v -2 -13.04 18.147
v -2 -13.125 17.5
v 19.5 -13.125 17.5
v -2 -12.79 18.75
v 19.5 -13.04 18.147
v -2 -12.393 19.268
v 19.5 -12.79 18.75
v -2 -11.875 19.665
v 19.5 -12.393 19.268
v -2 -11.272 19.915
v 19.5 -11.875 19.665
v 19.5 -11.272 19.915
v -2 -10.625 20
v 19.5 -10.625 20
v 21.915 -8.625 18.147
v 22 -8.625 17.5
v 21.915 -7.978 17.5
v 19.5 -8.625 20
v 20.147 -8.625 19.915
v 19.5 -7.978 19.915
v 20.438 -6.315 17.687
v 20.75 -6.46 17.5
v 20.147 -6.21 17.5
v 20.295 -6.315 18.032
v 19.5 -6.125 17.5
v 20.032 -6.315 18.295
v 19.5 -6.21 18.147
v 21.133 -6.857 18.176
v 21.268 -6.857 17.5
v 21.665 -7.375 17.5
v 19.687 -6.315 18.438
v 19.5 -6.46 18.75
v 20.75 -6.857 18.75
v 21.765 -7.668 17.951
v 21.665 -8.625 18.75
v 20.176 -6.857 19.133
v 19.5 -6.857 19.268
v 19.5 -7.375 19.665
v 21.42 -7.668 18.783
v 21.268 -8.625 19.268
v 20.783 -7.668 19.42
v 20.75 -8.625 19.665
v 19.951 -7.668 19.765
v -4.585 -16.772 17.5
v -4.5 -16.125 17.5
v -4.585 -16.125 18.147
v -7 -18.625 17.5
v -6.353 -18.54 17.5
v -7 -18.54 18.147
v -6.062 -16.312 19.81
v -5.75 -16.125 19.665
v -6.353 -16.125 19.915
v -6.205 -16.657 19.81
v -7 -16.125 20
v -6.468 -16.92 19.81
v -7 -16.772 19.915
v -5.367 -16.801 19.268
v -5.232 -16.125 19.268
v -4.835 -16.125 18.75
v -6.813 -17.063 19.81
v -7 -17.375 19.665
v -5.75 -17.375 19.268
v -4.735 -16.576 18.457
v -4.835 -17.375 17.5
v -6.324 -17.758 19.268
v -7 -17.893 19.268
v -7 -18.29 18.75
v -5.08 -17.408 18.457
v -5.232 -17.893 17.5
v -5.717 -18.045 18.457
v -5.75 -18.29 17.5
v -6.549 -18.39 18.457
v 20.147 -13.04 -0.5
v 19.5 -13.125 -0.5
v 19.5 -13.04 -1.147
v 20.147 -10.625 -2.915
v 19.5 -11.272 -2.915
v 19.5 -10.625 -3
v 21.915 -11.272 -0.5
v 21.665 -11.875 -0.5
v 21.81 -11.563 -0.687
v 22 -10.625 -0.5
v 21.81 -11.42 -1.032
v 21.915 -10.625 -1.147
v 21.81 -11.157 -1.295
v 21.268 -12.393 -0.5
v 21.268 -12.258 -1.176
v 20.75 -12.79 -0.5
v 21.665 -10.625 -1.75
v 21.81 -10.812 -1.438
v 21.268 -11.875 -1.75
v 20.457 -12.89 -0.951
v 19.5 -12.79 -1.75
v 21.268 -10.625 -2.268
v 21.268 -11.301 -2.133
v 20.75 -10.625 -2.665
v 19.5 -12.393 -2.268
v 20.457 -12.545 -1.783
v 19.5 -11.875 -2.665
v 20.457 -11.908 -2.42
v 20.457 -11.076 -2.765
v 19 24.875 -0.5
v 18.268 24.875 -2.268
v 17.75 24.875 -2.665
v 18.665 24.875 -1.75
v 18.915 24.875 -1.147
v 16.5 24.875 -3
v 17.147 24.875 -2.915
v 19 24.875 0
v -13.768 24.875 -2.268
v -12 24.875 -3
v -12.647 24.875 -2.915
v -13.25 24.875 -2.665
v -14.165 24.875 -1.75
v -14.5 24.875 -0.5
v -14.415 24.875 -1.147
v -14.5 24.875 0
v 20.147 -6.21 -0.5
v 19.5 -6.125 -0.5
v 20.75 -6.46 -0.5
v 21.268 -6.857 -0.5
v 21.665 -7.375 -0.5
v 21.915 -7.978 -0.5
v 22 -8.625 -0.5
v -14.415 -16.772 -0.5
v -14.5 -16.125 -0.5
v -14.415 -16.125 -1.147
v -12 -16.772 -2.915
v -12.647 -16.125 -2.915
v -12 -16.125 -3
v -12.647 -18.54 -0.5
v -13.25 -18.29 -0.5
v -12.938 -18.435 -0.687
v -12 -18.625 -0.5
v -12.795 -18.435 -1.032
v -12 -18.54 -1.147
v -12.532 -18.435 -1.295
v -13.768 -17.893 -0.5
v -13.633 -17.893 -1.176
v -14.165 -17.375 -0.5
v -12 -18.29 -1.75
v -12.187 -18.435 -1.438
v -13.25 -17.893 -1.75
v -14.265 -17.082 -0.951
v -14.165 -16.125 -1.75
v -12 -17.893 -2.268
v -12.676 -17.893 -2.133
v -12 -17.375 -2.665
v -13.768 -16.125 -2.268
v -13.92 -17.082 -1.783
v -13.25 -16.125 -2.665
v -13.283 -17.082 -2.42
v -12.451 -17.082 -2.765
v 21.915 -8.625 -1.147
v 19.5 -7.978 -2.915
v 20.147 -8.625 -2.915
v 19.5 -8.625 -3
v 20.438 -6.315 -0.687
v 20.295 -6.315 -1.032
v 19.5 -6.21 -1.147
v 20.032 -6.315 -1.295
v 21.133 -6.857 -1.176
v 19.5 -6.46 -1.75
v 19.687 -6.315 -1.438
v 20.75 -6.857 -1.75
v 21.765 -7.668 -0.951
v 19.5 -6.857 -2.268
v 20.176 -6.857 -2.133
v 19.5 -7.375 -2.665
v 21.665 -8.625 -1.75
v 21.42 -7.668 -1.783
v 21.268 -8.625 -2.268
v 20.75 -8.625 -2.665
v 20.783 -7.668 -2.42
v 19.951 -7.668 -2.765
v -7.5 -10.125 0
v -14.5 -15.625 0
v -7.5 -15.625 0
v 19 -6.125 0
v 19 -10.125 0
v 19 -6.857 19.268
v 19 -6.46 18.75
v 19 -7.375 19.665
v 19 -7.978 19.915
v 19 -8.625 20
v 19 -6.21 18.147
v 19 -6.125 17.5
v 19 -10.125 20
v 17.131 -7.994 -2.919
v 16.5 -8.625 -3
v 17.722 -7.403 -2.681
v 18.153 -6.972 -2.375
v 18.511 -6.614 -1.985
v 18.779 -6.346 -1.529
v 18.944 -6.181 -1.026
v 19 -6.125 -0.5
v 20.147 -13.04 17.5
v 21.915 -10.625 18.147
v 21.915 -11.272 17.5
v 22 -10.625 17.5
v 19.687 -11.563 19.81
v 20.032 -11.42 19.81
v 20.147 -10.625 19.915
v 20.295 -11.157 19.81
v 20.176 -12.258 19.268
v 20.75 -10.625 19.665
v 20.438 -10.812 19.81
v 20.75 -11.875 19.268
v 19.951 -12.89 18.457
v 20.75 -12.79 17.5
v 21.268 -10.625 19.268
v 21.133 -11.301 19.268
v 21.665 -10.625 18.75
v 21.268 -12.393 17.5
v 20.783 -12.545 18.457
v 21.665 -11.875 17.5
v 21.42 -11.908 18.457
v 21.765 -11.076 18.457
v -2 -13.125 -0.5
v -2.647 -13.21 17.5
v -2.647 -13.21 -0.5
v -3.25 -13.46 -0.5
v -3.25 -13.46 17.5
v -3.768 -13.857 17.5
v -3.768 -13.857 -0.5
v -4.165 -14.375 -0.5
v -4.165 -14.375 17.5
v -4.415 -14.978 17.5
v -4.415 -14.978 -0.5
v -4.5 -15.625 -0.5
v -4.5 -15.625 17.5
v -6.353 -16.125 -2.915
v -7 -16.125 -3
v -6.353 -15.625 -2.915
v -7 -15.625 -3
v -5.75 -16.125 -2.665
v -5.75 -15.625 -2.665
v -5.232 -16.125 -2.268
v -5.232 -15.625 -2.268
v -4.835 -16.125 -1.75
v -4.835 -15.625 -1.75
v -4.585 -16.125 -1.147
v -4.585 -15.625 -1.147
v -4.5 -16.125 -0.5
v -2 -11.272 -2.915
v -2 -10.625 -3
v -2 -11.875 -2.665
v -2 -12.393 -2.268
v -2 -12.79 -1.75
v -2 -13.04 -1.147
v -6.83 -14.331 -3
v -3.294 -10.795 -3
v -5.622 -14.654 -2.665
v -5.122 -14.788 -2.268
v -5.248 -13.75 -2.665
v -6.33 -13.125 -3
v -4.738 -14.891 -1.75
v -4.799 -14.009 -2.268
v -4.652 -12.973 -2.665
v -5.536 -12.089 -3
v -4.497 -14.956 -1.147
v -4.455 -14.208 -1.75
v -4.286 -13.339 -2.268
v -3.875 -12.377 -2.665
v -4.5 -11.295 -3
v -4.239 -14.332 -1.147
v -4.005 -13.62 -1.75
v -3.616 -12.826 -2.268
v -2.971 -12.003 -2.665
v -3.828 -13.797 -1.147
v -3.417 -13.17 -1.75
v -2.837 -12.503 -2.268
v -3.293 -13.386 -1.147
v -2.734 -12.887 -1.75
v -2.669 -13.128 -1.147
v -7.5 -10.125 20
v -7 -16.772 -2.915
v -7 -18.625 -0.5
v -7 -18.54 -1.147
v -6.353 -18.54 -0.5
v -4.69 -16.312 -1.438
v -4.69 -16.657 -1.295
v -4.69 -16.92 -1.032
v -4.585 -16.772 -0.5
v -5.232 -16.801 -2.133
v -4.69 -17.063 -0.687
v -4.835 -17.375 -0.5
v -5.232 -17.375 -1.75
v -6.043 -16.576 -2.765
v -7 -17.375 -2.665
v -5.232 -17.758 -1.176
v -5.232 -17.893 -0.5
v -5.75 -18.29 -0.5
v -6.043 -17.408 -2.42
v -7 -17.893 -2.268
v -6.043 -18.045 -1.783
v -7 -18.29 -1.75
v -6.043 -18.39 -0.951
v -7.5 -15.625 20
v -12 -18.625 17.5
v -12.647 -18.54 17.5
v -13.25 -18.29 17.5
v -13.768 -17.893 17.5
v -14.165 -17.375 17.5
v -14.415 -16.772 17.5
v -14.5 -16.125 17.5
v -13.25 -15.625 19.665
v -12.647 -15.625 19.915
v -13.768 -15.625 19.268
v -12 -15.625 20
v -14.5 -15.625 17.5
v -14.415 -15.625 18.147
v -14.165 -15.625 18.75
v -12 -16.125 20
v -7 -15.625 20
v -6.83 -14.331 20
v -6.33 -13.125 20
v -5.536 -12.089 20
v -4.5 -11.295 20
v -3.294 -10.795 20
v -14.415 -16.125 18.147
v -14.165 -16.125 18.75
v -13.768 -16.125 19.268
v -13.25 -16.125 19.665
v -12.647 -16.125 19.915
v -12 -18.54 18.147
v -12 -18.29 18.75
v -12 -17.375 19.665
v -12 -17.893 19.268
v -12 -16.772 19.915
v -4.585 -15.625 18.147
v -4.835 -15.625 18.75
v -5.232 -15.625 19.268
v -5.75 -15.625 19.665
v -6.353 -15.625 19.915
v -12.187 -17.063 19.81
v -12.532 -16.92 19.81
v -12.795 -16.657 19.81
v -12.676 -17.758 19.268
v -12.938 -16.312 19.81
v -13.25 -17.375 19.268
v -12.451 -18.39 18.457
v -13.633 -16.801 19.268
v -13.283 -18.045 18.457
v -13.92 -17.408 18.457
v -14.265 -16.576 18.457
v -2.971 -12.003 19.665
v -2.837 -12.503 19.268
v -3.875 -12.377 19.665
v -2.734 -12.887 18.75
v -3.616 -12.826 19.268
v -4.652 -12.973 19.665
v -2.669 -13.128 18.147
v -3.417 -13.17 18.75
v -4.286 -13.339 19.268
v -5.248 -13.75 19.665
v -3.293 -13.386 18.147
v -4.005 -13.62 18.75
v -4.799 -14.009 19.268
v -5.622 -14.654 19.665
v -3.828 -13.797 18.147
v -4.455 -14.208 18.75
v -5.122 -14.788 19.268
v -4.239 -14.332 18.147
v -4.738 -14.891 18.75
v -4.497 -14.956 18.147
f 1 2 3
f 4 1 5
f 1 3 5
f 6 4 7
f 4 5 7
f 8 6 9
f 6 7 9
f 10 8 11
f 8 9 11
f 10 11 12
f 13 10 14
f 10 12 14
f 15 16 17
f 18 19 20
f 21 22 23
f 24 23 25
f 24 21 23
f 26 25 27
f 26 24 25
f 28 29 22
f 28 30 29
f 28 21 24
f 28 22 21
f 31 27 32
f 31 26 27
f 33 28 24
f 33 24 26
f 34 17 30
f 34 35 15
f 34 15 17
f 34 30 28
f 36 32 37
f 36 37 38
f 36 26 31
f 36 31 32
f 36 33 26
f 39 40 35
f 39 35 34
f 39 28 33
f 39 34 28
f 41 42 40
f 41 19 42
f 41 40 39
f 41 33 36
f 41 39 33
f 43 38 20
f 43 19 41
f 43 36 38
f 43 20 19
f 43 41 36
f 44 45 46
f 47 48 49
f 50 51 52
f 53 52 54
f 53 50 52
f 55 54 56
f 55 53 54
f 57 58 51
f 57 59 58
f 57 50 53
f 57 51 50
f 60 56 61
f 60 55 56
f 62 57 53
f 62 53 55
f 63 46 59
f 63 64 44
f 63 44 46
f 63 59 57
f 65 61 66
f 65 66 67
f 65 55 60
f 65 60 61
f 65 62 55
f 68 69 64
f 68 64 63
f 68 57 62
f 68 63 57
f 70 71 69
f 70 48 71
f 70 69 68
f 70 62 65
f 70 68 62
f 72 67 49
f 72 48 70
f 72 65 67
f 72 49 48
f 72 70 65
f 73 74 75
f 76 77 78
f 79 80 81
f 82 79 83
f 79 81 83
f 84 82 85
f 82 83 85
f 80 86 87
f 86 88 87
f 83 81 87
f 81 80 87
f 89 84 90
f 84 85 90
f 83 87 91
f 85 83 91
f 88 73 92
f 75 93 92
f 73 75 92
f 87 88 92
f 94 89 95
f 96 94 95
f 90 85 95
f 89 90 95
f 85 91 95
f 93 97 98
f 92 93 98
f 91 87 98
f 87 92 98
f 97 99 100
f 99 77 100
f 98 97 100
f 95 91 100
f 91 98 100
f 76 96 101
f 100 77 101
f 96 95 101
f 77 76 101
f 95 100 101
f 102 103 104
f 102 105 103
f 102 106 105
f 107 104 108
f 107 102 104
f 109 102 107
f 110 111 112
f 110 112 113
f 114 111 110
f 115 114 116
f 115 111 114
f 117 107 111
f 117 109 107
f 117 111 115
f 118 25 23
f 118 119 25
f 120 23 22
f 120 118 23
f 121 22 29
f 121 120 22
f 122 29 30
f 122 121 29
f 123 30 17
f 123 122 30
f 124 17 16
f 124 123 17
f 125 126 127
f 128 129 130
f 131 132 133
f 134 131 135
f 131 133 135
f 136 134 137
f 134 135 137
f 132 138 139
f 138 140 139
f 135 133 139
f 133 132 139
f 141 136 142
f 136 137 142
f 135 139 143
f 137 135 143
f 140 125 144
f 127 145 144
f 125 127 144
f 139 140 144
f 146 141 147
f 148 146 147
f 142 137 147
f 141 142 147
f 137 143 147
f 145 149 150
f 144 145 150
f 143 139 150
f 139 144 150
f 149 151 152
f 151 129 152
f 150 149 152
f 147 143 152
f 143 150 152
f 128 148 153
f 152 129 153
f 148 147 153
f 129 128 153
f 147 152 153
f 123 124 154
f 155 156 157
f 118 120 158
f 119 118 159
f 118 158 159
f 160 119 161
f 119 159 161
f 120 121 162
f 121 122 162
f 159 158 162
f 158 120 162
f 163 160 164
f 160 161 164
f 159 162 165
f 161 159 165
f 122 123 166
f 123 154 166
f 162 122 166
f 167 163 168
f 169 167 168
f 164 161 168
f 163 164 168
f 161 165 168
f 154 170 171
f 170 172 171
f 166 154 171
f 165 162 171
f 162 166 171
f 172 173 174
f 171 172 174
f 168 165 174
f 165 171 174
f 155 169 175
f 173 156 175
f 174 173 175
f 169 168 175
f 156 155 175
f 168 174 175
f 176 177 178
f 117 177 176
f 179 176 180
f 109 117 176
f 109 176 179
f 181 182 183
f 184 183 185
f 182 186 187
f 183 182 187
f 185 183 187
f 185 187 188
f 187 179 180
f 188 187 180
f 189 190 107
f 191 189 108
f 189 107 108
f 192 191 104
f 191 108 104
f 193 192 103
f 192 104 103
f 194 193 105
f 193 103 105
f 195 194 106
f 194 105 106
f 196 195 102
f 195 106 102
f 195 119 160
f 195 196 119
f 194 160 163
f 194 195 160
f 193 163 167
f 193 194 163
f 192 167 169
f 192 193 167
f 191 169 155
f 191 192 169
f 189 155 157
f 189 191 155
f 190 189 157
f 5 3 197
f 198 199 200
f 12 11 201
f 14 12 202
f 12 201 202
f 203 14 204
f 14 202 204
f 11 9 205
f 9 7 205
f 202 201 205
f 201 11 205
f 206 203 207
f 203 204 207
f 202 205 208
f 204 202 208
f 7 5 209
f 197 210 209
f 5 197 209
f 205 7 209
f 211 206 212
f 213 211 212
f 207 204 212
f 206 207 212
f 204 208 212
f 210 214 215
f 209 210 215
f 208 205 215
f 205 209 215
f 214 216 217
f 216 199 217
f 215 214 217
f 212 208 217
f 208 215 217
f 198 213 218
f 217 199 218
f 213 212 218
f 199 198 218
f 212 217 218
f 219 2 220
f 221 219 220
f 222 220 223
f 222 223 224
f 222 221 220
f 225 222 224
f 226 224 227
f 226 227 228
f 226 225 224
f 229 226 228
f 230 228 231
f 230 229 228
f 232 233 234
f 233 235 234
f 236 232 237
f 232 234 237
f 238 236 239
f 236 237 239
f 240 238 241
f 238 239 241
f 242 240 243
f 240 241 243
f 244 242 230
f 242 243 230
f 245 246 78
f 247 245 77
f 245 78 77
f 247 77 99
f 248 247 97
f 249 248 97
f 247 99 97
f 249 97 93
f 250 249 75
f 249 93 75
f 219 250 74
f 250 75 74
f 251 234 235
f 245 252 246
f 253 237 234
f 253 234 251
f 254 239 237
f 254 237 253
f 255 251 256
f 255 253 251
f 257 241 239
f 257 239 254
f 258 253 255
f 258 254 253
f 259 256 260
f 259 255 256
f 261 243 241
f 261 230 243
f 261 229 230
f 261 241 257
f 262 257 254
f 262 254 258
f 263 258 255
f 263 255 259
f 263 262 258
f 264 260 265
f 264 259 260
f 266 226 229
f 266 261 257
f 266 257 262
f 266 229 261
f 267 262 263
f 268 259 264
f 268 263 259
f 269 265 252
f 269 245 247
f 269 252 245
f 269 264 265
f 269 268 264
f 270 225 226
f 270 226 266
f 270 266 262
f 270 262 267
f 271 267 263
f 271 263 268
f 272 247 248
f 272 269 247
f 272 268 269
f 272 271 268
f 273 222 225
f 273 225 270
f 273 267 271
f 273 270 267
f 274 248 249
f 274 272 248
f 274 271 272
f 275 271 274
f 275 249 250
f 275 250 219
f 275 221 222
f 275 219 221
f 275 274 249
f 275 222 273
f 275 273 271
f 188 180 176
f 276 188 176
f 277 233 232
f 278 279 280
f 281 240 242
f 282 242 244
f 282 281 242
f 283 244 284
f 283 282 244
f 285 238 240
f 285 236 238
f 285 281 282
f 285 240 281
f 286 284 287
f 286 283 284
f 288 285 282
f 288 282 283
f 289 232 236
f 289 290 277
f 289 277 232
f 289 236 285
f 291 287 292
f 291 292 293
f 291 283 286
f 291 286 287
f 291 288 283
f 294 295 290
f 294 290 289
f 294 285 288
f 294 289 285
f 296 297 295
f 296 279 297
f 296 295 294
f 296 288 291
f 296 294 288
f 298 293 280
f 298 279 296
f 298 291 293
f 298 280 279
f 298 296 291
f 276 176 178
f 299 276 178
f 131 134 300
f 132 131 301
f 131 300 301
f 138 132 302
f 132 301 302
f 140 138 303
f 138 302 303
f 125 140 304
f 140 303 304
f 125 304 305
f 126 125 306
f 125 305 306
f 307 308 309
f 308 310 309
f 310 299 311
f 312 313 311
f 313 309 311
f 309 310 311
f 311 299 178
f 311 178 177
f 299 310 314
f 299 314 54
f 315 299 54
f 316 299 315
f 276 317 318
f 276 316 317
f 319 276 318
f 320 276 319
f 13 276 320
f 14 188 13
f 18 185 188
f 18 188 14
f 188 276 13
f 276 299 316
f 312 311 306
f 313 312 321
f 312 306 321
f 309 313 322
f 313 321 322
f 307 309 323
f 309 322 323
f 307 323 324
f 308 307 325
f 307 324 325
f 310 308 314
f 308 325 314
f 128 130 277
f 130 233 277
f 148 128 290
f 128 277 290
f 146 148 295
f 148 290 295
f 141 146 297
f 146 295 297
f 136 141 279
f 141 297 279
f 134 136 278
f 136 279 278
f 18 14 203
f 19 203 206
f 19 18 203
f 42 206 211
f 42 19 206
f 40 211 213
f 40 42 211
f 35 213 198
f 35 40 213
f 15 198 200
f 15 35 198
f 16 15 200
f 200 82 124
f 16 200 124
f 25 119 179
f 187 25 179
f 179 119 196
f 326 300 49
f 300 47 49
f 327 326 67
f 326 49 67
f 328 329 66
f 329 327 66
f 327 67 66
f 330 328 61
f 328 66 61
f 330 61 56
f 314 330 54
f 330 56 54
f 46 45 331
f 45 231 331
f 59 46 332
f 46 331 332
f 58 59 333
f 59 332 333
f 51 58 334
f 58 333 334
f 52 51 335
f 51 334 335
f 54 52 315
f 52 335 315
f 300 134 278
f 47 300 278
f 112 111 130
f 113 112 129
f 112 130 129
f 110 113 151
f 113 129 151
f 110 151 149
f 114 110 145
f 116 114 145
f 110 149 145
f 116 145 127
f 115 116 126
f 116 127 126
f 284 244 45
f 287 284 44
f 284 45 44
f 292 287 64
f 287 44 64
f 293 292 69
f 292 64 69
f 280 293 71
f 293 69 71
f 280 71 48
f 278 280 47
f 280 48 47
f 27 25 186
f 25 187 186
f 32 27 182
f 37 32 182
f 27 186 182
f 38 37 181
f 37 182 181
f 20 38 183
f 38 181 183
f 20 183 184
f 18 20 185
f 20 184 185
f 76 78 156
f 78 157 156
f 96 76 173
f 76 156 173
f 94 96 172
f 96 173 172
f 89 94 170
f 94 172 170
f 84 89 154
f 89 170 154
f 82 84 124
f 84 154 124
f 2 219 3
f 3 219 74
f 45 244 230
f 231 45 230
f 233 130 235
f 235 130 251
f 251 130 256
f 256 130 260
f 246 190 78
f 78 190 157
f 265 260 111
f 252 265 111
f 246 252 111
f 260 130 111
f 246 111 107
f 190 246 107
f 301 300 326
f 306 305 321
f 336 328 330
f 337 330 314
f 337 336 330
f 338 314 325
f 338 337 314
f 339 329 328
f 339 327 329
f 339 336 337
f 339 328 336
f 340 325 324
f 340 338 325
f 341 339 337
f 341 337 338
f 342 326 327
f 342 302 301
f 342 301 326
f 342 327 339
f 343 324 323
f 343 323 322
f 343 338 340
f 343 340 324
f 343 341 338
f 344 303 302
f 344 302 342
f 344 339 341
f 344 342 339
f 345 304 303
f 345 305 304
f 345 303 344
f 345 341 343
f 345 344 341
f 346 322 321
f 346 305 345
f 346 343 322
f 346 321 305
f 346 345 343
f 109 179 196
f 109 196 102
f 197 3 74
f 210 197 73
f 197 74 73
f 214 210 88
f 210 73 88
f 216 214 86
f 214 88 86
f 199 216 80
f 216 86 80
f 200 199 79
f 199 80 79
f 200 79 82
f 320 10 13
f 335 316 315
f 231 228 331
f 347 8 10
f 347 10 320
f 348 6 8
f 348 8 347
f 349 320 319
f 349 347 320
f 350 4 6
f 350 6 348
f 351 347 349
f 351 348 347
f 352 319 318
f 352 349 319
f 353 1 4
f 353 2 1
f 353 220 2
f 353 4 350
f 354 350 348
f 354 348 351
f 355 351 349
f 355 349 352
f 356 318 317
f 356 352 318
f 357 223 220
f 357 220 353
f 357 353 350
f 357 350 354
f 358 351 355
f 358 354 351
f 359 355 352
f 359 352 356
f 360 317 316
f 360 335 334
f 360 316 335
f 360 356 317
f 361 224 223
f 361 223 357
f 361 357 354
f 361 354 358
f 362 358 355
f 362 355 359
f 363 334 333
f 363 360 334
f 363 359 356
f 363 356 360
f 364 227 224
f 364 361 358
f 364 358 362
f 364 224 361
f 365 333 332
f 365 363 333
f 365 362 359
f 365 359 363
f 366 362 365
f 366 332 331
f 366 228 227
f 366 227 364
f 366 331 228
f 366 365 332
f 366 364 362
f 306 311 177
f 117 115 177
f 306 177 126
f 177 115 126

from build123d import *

# Parameters (mm, degrees)
F0_W     = 23.5
F0_H     = 3
F1_DEPTH = 3
F2_DEPTH = 20
F3_R     = 2.5


with BuildPart() as f1:
    # F0 (on Top) → F1 (new body)
    with BuildSketch(Plane.XY):
        Polygon((-14.5, 24.875), (-14.5, -15.625), (-7.5, -15.625), (-7.5, -10.125), (-4.5, -10.125), (19, -10.125), (19, -6.125), (19, 24.875), align=None)
        Polygon((-7.5, -15.625), (-14.5, -15.625), (-14.5, -18.625), (-7.5, -18.625), (-4.5, -18.625), (-4.5, -13.125), (-4.5, -10.125), (-7.5, -10.125), align=None)
        with Locations((7.25, -11.625)):
            Rectangle(F0_W, F0_H)
        Polygon((22, -6.125), (19, -6.125), (19, -10.125), (19, -13.125), (22, -13.125), (22, -10.125), align=None)
    extrude(amount=-F1_DEPTH)

    # F0 (on Top) → F2 (join)
    with BuildSketch(Plane.XY):
        Polygon((22, -6.125), (19, -6.125), (19, -10.125), (19, -13.125), (22, -13.125), (22, -10.125), align=None)
        with Locations((7.25, -11.625)):
            Rectangle(F0_W, F0_H)
        Polygon((-7.5, -15.625), (-14.5, -15.625), (-14.5, -18.625), (-7.5, -18.625), (-4.5, -18.625), (-4.5, -13.125), (-4.5, -10.125), (-7.5, -10.125), align=None)
    extrude(amount=F2_DEPTH)

    # F3
    f3_edges = [f1.edges().sort_by_distance(p)[0] for p in [
        (-14.5, 3.125, -3),
        (-14.5, -18.625, 8.5),
        (-9.5, -18.625, -3),
        (-4.5, -15.875, -3),
        (8.75, -13.125, -3),
        (-4.5, -13.125, 8.5),
        (-4.5, -18.625, 8.5),
        (22, -13.125, 8.5),
        (22, -9.625, -3),
        (8.75, -13.125, 20),
        (-4.5, -15.875, 20),
        (-9.5, -18.625, 20),
        (22, -9.625, 20),
        (22, -6.125, 8.5),
        (20.5, -6.125, -3),
        (19, 9.375, -3),
        (20.5, -6.125, 20),
        (-14.5, -17.125, 20),
    ]]
    fillet(f3_edges, radius=F3_R)


solid = f1.part
